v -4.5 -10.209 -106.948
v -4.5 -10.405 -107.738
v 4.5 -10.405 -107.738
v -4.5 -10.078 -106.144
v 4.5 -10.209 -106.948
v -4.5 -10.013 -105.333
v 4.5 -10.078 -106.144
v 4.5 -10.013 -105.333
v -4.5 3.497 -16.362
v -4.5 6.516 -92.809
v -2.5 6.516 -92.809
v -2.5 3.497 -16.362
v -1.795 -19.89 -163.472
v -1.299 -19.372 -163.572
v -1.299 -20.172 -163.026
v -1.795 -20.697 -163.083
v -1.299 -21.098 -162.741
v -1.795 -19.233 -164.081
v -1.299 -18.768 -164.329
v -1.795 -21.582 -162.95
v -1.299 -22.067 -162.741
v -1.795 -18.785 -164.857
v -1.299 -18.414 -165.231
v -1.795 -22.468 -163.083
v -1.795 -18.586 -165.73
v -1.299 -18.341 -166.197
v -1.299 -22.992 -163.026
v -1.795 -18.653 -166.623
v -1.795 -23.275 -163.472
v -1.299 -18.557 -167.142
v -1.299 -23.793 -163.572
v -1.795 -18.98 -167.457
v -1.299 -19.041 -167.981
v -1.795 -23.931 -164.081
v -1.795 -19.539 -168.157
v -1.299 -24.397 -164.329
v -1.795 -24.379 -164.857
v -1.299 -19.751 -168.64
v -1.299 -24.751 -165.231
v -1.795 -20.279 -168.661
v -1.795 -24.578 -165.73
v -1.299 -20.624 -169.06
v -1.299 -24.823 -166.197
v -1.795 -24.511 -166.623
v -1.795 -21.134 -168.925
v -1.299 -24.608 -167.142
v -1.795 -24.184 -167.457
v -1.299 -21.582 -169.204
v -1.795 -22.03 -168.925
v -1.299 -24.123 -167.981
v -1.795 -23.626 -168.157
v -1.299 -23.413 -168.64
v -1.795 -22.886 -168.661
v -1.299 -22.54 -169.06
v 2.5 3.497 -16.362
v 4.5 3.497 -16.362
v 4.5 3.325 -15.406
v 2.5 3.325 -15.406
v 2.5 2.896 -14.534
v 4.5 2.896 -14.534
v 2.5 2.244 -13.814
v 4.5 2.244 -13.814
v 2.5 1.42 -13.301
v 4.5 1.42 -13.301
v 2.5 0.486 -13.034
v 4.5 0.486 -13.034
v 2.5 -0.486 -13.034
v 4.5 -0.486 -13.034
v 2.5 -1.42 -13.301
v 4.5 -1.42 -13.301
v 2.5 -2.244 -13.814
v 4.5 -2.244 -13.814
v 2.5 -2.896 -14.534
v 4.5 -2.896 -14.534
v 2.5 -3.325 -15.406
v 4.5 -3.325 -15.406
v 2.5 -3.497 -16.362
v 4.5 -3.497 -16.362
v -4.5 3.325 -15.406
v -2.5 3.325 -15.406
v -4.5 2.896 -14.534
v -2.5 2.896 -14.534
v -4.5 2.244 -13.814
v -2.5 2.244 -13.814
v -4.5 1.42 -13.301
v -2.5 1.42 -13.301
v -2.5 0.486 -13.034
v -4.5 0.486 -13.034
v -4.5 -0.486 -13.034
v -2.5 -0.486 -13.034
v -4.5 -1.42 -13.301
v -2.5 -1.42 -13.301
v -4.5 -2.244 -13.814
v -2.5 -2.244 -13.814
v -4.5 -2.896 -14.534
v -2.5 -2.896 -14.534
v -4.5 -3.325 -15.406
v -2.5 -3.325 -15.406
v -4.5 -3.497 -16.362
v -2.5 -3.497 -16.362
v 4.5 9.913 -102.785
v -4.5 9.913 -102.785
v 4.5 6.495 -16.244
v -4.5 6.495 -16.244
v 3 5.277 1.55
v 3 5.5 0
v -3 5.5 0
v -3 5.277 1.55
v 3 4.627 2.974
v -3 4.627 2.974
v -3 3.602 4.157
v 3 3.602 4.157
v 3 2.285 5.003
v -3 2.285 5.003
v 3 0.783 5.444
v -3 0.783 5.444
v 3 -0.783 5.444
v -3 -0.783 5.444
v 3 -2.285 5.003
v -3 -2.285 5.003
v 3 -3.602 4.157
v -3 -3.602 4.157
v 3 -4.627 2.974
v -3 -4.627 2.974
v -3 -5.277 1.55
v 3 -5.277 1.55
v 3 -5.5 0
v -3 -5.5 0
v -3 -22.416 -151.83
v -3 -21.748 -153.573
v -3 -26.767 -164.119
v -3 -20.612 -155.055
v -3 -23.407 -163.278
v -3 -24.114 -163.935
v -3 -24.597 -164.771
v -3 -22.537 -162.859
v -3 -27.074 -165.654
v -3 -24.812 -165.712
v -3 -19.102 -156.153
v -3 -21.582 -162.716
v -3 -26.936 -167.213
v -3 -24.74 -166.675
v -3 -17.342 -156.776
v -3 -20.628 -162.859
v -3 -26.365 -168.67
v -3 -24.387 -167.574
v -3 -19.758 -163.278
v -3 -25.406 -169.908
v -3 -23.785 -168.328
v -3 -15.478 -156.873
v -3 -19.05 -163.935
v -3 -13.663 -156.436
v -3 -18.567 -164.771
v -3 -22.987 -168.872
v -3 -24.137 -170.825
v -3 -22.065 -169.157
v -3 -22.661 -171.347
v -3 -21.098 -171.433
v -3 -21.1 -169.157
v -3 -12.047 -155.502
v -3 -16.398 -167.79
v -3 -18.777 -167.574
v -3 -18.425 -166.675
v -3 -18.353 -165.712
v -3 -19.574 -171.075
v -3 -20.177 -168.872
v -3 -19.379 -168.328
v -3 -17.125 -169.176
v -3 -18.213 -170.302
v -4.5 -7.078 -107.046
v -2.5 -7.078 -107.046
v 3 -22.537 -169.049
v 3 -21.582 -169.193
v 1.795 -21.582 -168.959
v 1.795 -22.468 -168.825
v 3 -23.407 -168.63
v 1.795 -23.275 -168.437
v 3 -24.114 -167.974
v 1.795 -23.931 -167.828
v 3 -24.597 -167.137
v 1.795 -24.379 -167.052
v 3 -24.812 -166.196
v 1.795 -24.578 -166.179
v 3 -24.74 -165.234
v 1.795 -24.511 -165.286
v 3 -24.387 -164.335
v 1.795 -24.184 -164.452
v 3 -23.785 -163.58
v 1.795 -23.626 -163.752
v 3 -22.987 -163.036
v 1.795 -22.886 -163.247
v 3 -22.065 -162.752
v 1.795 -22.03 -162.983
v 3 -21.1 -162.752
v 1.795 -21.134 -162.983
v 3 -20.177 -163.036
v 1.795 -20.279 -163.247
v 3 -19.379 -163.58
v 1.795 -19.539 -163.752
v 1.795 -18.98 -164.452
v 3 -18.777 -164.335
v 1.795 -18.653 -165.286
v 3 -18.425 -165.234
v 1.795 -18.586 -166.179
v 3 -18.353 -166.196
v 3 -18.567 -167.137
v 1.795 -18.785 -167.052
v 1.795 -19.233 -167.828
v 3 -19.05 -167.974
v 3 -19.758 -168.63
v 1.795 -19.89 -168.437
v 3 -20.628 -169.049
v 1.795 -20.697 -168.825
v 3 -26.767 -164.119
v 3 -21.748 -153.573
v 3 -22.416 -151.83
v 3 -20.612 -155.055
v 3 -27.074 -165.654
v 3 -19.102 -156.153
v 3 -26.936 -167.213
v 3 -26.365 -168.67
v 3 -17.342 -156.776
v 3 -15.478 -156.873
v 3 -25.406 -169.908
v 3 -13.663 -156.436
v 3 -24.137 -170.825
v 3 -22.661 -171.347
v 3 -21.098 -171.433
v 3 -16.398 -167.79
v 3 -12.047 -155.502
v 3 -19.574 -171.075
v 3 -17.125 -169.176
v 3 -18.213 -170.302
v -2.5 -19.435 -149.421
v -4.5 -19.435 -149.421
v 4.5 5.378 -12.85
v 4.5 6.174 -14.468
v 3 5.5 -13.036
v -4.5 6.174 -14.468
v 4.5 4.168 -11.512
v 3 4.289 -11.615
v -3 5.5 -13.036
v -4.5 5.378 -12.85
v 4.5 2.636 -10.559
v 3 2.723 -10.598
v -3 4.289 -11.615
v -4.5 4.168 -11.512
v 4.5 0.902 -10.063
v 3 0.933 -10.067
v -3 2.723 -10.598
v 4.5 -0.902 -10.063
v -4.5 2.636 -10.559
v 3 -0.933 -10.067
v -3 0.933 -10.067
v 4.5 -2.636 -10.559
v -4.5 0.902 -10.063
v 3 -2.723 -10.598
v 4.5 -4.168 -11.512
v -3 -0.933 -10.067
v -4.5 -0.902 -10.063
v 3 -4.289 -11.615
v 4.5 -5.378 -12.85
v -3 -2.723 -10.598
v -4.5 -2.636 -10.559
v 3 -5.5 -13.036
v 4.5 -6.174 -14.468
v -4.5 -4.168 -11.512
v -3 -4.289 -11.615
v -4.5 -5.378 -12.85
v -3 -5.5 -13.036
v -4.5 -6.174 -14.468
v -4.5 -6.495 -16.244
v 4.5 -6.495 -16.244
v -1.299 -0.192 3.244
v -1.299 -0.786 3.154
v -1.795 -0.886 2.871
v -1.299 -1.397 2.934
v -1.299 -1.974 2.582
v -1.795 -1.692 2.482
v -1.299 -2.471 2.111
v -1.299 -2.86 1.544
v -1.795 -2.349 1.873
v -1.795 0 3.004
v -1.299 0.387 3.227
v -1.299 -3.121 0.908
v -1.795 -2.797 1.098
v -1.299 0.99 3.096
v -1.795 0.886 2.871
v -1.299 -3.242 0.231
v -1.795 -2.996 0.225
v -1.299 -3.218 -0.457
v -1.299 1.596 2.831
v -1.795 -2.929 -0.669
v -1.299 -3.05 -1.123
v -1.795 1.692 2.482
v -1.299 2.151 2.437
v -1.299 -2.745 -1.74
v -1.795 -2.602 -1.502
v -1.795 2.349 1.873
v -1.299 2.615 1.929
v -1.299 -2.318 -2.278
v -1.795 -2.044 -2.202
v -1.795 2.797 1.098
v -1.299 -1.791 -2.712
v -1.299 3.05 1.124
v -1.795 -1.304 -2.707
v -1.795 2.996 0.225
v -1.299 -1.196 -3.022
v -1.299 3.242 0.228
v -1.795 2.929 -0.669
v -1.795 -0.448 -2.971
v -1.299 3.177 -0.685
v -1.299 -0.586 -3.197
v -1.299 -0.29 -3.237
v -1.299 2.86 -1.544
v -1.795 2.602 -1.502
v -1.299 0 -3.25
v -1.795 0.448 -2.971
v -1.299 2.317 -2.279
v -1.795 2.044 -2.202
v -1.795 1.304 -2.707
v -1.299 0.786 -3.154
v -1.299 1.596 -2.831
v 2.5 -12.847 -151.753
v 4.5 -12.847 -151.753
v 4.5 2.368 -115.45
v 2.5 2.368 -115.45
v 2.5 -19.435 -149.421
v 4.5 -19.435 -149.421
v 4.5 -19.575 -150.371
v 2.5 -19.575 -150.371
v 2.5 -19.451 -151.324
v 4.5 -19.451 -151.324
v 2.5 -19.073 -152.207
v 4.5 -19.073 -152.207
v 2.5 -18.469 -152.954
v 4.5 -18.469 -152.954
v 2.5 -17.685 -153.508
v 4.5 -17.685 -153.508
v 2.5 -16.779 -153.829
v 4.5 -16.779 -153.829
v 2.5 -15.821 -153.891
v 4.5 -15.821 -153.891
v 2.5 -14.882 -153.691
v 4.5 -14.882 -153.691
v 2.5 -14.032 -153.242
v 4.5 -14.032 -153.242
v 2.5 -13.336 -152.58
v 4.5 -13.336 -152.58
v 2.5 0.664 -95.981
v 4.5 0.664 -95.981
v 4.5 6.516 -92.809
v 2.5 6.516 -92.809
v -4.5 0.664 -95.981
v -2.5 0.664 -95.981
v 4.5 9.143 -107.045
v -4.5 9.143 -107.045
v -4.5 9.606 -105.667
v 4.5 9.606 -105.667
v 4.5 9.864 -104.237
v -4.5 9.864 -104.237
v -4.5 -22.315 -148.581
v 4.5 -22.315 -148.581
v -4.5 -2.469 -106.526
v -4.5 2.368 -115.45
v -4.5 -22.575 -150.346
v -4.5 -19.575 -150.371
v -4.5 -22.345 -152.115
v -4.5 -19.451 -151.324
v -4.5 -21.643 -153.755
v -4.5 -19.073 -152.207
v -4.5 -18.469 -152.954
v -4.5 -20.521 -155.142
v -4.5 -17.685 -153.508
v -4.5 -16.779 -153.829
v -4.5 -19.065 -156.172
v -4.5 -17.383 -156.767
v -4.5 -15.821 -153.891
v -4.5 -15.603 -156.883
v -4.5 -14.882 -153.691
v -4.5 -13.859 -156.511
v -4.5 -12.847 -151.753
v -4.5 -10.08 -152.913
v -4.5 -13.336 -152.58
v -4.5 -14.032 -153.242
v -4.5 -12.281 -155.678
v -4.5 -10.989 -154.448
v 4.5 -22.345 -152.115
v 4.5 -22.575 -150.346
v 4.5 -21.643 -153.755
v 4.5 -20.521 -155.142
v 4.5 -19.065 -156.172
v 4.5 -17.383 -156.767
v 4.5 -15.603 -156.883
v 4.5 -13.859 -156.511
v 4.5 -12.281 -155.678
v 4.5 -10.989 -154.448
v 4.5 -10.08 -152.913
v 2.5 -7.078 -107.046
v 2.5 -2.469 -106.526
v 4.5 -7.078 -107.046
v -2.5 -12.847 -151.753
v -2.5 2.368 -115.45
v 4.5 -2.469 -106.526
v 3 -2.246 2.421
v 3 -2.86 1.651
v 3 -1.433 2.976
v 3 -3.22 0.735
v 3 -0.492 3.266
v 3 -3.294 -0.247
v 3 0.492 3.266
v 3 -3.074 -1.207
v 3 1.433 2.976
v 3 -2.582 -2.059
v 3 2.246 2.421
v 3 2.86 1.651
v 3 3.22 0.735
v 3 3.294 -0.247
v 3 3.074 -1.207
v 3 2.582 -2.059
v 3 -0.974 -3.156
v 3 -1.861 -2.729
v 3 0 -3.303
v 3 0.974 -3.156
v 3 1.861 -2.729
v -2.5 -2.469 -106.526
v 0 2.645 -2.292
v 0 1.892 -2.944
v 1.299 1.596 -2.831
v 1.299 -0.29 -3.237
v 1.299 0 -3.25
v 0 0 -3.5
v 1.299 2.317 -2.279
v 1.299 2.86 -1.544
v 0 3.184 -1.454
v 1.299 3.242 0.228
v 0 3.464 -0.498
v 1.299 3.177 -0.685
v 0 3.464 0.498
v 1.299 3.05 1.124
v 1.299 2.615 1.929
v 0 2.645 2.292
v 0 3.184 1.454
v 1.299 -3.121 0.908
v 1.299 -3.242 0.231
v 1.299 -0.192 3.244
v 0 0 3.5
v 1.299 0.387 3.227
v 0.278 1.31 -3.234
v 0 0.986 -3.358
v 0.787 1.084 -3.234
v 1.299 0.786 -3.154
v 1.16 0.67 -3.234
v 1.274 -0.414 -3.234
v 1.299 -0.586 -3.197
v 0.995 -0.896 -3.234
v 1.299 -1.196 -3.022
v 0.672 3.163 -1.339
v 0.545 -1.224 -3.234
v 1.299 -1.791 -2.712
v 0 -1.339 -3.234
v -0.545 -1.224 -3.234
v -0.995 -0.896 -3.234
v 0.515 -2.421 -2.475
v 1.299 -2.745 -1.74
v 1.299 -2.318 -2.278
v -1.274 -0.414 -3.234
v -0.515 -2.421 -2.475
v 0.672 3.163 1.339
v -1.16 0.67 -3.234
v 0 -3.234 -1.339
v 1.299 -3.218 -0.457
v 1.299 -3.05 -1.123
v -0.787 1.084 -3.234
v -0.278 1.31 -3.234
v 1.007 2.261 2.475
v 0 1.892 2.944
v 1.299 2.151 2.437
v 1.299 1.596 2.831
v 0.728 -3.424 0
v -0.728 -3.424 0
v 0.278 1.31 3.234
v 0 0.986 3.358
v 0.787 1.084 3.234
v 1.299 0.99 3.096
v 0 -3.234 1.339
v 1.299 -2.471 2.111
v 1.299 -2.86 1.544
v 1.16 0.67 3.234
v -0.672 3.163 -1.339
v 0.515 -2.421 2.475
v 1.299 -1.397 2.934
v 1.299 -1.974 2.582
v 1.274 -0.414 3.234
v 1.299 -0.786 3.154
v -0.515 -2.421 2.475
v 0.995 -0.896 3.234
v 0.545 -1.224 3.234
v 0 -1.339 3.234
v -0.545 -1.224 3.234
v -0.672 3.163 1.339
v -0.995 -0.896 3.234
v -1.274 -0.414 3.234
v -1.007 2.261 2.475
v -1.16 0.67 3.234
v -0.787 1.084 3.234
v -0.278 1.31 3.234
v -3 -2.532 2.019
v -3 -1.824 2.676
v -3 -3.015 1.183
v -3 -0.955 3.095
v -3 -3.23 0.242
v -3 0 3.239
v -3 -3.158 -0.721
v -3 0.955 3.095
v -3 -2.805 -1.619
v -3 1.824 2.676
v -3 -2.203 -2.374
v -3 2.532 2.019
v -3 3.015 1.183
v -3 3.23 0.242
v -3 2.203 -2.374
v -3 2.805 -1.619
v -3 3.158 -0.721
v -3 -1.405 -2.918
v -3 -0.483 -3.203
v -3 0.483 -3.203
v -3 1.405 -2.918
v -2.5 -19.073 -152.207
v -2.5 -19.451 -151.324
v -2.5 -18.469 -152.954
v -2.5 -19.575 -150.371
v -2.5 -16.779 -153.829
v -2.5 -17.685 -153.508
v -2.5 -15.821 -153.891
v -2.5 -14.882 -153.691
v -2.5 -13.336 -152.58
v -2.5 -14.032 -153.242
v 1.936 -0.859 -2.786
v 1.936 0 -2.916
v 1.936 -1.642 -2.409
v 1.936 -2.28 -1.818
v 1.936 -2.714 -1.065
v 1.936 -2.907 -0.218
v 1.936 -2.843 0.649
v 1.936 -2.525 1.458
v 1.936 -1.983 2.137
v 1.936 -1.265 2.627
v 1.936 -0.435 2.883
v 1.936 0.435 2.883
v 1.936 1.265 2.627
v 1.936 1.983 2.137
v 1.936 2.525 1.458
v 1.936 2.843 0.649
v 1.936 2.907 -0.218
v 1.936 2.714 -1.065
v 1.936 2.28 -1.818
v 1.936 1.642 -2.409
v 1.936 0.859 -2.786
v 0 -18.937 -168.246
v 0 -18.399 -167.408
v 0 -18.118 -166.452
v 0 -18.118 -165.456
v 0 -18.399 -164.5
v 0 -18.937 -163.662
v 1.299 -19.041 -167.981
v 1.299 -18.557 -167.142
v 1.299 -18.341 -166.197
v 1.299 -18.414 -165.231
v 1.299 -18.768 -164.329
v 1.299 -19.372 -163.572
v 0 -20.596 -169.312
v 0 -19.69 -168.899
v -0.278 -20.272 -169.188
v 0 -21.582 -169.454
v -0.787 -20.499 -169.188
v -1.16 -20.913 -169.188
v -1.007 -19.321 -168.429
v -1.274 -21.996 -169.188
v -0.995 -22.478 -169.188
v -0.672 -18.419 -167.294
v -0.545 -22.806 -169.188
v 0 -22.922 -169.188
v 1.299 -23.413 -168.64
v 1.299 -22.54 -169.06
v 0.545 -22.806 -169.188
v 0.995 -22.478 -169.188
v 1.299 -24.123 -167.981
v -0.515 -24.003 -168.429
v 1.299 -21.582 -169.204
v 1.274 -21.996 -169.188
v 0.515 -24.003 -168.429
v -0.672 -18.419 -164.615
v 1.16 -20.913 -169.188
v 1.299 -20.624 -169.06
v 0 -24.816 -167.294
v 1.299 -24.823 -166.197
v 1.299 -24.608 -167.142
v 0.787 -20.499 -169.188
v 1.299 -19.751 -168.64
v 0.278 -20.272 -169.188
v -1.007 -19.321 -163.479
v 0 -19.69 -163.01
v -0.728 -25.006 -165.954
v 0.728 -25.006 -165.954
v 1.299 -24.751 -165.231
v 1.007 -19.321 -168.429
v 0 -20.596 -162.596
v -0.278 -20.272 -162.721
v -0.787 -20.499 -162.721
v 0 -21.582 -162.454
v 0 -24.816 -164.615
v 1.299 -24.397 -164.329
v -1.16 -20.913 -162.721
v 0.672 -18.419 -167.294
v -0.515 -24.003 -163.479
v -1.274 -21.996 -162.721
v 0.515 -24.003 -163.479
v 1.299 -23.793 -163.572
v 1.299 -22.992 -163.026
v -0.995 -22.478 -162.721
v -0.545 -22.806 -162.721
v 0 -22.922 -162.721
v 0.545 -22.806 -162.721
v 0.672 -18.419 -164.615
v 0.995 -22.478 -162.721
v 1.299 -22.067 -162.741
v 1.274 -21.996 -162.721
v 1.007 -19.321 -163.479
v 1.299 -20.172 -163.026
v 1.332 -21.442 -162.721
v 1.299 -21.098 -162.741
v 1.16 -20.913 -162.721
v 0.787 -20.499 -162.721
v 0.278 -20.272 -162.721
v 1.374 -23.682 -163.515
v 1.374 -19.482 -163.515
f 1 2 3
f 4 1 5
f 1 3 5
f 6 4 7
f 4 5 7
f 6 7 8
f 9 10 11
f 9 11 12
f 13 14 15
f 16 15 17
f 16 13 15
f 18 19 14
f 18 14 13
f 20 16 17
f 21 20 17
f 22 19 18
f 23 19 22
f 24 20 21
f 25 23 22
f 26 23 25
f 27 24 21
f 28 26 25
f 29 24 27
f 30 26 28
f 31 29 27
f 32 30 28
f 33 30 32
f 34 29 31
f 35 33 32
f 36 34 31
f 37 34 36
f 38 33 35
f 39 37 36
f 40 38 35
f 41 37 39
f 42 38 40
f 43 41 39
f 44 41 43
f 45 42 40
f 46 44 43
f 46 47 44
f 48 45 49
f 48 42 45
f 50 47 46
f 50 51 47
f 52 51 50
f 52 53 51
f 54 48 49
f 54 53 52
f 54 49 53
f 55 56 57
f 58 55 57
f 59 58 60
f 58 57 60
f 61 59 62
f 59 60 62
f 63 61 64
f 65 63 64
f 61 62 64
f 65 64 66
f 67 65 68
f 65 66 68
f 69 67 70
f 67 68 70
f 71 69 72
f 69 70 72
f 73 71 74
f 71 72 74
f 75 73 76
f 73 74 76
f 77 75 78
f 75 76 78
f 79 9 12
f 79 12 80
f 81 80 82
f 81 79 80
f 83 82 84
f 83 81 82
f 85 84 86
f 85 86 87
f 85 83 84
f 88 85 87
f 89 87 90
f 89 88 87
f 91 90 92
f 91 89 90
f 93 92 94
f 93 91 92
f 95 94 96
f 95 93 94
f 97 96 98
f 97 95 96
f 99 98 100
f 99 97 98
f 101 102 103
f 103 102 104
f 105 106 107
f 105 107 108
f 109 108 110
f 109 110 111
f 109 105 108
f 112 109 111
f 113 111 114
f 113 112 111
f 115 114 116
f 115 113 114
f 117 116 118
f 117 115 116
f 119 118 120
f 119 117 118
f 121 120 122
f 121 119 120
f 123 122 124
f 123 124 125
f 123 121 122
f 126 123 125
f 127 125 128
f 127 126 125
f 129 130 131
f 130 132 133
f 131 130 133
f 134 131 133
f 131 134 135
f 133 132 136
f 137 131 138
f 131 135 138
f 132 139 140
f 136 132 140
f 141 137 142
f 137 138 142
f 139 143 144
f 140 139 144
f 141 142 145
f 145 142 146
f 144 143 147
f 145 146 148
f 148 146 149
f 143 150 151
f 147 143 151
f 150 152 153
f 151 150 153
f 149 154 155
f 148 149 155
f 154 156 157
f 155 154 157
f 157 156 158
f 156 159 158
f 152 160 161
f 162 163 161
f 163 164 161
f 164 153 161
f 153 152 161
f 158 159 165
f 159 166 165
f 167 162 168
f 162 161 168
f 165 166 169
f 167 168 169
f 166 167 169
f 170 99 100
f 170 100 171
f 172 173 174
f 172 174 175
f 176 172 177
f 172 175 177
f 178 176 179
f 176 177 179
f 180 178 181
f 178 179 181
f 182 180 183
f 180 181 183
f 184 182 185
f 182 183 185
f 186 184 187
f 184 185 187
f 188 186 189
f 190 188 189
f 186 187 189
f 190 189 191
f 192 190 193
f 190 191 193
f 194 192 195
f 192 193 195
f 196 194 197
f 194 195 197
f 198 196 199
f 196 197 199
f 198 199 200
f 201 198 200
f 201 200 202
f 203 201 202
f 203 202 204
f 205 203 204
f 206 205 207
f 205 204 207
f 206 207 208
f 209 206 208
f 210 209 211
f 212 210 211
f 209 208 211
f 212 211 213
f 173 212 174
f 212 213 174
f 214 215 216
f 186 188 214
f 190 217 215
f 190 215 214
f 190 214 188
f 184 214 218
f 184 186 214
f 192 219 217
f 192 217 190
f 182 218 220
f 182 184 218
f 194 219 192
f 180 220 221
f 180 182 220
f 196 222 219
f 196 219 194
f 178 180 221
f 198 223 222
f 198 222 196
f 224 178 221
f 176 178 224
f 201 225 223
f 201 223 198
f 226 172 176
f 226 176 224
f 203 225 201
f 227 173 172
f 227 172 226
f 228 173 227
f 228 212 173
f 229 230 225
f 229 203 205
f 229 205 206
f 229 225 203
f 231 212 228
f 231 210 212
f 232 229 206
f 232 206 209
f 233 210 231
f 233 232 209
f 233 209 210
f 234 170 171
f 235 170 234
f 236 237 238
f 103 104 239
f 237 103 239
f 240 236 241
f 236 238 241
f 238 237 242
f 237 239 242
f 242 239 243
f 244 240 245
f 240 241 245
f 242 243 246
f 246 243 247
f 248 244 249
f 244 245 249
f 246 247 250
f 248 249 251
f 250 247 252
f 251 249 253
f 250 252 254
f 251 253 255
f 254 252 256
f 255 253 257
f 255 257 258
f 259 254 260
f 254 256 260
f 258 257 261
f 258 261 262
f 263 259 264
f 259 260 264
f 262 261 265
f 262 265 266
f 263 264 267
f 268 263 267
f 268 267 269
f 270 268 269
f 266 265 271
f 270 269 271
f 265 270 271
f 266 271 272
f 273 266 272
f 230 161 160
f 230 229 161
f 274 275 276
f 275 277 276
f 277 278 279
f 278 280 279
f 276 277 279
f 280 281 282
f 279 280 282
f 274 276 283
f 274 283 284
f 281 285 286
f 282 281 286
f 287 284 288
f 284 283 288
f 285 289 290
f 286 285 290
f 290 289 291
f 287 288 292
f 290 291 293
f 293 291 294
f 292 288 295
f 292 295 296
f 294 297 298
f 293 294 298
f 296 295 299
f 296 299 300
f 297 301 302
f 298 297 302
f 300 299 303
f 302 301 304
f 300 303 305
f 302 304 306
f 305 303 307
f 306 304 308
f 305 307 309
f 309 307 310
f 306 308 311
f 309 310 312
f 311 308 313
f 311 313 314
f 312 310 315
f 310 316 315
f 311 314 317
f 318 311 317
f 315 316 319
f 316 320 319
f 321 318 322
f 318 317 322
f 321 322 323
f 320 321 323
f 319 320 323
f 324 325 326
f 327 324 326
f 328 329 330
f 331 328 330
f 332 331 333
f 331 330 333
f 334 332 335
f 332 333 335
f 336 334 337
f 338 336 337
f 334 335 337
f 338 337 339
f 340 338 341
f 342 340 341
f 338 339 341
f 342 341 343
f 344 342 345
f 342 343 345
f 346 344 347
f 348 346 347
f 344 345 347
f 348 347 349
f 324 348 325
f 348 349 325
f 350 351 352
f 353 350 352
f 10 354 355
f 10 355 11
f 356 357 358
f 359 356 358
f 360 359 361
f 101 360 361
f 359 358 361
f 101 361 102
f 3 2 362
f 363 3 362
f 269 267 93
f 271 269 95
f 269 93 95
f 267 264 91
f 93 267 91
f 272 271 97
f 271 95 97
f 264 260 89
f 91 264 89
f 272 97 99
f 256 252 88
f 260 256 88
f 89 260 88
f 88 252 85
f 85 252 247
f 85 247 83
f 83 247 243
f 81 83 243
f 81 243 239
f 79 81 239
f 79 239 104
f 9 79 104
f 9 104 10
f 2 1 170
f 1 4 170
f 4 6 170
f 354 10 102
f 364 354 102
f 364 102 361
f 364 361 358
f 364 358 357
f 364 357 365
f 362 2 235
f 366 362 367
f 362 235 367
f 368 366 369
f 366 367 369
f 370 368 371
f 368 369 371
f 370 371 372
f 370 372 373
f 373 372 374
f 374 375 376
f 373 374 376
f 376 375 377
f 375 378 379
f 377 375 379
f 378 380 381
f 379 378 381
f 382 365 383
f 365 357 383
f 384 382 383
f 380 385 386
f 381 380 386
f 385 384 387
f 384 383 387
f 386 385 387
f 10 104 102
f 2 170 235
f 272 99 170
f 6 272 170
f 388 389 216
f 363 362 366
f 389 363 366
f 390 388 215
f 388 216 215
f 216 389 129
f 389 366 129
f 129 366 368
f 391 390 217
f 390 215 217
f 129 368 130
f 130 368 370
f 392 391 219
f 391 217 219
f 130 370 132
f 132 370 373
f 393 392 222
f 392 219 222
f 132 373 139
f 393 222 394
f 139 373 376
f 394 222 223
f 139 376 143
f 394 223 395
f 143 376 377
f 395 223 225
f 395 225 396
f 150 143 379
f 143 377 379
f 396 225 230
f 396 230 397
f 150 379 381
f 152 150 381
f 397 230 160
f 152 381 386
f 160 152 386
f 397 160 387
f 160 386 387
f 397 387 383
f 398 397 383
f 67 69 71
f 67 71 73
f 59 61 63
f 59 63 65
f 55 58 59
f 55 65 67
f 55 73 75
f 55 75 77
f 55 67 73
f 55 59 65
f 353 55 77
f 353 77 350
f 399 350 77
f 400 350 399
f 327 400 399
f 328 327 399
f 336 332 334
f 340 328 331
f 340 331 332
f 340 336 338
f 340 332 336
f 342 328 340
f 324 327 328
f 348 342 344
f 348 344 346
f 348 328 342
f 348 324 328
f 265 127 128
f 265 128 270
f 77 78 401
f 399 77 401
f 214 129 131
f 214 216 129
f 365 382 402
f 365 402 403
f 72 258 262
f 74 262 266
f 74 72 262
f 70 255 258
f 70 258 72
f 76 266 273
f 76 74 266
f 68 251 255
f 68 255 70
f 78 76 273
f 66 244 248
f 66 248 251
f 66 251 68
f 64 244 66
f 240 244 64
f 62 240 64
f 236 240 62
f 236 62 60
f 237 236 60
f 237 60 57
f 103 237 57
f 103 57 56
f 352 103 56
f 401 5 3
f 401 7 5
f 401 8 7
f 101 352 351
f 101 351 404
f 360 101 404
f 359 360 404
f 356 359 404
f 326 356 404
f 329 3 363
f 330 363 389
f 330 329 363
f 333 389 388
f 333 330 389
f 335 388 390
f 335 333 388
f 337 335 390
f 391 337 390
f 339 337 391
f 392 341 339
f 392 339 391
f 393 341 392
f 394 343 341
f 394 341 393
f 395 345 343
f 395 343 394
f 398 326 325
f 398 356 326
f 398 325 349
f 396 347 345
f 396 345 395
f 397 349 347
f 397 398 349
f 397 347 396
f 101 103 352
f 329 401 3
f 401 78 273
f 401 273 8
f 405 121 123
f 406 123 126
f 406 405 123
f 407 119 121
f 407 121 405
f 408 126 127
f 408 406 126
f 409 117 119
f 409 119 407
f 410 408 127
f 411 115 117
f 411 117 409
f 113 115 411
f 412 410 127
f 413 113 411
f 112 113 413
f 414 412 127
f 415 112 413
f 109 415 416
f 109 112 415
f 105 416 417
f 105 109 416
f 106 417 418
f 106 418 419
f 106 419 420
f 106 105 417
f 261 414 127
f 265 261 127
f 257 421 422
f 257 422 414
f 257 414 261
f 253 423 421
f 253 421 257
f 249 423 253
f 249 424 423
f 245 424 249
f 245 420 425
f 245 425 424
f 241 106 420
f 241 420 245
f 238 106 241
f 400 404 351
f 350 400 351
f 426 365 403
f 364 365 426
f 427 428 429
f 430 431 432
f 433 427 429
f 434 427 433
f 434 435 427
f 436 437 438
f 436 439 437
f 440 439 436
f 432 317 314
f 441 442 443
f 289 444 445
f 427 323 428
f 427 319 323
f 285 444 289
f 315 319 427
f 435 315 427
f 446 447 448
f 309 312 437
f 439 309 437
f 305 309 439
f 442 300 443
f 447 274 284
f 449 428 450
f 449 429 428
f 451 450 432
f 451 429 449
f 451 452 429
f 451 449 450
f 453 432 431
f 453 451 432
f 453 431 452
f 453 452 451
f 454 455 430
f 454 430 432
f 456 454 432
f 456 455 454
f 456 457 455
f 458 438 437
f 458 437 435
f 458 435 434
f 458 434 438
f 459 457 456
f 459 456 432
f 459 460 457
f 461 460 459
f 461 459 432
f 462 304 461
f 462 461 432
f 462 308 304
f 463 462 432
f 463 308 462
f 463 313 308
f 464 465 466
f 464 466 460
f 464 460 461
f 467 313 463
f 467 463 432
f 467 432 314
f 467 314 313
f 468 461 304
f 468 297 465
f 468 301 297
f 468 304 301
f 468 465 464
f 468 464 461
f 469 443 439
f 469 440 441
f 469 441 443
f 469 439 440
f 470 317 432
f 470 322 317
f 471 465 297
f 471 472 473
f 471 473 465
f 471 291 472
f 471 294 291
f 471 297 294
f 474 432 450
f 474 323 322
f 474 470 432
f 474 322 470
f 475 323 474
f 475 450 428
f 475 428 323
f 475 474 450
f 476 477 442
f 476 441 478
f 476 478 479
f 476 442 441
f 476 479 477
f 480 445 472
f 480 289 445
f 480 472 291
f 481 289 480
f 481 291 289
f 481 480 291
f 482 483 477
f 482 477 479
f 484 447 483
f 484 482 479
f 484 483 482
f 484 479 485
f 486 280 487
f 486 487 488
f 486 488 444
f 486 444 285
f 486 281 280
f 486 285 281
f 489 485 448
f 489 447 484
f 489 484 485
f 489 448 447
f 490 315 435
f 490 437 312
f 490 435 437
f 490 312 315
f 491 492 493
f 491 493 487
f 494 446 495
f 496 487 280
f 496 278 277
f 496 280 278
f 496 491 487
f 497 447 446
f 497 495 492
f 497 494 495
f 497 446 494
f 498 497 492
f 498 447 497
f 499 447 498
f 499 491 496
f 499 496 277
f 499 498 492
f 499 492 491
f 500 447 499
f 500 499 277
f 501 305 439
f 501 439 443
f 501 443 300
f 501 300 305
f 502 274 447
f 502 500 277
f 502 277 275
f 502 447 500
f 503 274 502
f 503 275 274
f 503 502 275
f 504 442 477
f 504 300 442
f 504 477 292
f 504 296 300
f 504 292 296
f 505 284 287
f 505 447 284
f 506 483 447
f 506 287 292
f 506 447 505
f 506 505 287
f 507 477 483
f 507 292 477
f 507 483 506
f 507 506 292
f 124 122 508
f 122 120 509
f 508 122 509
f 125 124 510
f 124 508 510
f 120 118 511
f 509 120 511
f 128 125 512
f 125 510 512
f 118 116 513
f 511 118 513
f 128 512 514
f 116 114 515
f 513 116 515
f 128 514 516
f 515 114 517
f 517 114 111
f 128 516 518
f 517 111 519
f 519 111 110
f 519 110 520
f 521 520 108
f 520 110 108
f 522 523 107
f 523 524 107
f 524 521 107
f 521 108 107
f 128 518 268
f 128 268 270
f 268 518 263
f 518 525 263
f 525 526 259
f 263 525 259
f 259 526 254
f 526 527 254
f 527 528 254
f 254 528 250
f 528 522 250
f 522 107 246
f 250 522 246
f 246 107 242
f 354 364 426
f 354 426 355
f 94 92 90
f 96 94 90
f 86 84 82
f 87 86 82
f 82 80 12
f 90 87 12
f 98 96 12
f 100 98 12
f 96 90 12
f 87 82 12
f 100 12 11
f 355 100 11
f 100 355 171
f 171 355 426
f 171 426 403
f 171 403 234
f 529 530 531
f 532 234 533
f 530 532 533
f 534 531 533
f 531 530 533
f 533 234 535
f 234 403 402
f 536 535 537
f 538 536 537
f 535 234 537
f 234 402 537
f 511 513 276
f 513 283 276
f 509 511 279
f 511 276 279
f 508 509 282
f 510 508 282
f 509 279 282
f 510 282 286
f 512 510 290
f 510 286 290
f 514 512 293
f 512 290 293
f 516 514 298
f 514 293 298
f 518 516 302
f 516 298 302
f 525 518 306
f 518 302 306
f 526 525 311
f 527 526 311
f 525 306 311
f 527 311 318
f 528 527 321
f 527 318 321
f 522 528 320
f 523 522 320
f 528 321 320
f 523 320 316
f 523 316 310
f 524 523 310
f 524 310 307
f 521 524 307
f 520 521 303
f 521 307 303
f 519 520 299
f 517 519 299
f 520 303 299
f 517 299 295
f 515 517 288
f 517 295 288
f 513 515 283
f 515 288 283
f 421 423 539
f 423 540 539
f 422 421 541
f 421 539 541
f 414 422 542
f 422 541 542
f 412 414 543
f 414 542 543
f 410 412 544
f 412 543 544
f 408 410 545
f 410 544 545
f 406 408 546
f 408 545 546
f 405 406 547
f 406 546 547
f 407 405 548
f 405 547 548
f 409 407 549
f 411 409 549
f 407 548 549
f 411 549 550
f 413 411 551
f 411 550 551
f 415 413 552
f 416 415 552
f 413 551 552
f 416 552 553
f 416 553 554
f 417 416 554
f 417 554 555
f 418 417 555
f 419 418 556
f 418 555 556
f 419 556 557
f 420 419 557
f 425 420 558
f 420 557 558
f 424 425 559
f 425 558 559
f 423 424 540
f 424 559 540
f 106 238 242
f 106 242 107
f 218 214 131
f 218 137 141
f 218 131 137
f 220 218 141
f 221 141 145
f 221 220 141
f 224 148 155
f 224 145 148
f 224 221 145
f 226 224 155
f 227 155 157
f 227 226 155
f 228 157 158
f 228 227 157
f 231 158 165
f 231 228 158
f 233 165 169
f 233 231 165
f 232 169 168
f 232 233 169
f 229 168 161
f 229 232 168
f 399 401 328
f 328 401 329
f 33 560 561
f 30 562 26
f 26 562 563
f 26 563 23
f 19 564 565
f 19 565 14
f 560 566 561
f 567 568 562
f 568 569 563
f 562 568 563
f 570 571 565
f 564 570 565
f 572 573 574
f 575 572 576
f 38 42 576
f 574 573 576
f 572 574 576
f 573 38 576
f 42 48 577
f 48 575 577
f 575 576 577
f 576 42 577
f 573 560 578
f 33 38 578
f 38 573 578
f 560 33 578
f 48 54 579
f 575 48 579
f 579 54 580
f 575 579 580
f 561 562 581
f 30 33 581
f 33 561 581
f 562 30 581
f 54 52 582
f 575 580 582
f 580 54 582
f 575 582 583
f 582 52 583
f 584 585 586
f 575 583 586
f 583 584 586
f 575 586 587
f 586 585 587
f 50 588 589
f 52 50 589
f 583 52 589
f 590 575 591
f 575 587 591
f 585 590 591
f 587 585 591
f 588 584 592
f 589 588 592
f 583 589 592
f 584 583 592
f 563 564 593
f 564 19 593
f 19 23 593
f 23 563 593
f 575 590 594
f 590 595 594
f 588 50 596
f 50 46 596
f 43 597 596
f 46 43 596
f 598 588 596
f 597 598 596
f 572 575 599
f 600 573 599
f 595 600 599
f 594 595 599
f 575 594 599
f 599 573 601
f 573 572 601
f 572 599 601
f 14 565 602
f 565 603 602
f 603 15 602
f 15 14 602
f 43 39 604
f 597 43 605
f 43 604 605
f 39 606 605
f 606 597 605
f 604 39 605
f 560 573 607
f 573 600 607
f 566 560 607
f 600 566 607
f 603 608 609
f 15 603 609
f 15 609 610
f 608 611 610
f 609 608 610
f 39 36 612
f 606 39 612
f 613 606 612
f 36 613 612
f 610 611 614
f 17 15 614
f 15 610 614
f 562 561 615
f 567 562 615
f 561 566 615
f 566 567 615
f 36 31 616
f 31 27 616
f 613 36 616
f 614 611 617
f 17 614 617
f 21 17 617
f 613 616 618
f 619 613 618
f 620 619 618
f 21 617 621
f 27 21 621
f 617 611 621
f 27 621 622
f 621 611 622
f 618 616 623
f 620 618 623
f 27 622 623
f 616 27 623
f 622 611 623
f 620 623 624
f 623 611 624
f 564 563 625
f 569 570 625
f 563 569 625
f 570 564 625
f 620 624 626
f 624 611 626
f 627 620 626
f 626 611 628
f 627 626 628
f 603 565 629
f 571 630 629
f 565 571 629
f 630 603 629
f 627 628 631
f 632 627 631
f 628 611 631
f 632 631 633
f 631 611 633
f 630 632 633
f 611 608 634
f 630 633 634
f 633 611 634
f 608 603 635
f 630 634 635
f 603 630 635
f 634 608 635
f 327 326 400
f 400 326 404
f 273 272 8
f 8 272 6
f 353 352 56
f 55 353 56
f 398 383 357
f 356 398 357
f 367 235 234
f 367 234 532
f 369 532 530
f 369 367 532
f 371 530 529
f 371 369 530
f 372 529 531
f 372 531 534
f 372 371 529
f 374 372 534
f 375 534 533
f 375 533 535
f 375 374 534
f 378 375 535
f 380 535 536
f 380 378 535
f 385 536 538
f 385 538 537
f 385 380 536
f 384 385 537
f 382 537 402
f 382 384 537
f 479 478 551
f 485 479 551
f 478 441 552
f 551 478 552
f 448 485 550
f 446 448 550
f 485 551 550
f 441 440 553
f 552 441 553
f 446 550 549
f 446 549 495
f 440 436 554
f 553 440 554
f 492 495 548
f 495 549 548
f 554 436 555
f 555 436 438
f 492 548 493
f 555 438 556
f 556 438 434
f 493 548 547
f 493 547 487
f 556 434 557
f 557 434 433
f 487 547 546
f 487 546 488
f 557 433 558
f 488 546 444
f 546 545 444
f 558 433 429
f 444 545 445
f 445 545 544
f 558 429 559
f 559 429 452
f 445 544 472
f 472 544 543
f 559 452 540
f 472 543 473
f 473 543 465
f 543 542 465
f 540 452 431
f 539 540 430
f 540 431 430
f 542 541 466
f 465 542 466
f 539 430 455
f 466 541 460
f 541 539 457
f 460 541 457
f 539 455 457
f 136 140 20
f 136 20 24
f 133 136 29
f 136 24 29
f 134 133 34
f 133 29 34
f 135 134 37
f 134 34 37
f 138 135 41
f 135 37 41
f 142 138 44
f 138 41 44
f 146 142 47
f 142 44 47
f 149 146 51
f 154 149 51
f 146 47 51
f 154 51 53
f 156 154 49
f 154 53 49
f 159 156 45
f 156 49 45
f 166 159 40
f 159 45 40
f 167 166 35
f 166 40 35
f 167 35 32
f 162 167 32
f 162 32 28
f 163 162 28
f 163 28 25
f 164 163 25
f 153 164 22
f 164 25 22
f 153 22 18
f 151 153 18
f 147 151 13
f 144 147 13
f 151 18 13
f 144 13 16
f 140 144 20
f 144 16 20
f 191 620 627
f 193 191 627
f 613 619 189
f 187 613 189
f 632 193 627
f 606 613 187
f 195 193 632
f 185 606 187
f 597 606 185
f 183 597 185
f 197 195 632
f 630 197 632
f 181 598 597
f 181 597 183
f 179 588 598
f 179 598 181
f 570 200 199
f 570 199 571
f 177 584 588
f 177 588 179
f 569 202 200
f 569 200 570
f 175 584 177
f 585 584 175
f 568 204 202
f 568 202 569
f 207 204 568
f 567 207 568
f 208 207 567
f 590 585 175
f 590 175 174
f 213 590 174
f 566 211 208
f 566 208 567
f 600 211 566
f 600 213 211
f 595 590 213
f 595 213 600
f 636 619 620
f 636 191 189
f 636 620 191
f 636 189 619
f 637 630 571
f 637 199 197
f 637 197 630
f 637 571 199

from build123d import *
from build123d.topology import SkipClean

# Parameters (mm, degrees)
SKETCH1_R           = 3.25
BOSS_EXTRUDE1_DEPTH = 3
BOSS_EXTRUDE2_START = -4.5
BOSS_EXTRUDE2_DEPTH = 9
CUT_EXTRUDE1_DEPTH  = 2
FILLET1_R           = 10
CUT_EXTRUDE2_DEPTH  = 17
CHAMFER1_SIZE       = 1.5
CHAMFER1_SIZE_2     = 1.435934089
CUT_EXTRUDE3_DEPTH  = 17
CHAMFER2_SIZE       = 1.435934089


with BuildPart() as part:
    # Sketch1 → Boss-Extrude1 (new, symmetric)
    with BuildSketch(Plane(origin=(0, 0, 0), x_dir=(0, 0, -1), z_dir=(1, 0, 0))):
        with BuildLine():
            Line((105, 10), (16.24350989, 6.494937476))
            ThreePointArc((16.24350989, 6.494937476), (14.574337558, 6.208206195), (13.035898385, 5.5))
            Line((13.035898385, 5.5), (0, 5.5))
            ThreePointArc((0, 5.5), (-5.5, 0), (0, -5.5))
            Line((0, -5.5), (13.035898385, -5.5))
            ThreePointArc((13.035898385, -5.5), (14.574337558, -6.208206195), (16.24350989, -6.494937476))
            Line((16.24350989, -6.494937476), (106.559228351, -10.061575135))
            Line((106.559228351, -10.061575135), (148.580824133, -22.31516659))
            ThreePointArc((148.580824133, -22.31516659), (150.199105044, -22.57193923), (151.830180598, -22.41586927))
            Line((151.830180598, -22.41586927), (164.118536879, -26.766840037))
            ThreePointArc((164.118536879, -26.766840037), (171.138866131, -23.417963033), (167.789989128, -16.397633781))
            Line((167.789989128, -16.397633781), (155.501632847, -12.046663013))
            ThreePointArc((155.501632847, -12.046663013), (154.332173391, -10.899000225), (152.912873821, -10.08024872))
            Line((152.912873821, -10.08024872), (105, 10))
        make_face()
        Circle(SKETCH1_R, mode=Mode.SUBTRACT)
        with Locations((165.954263003, -21.582236909)):
            Circle(SKETCH1_R, mode=Mode.SUBTRACT)
    extrude(amount=BOSS_EXTRUDE1_DEPTH, both=True)

    # Boss-Extrude2: read off the stored shape, not the designer's step
    # Boss-Extrude2 outline → Boss-Extrude2 (add)
    with SkipClean():  # the faces are left unmerged after this step: merging them gives an invalid solid
        with BuildSketch(Plane(origin=(0, 0, 0), x_dir=(0, 0, -1), z_dir=(1, 0, 0)).offset(BOSS_EXTRUDE2_START)):
            with BuildLine():
                ThreePointArc((148.580824133, -22.31516659), (156.527711861, -18.244553046), (152.912873821, -10.08024872))
                Line((152.912873821, -10.08024872), (105, 10))
                Line((105, 10), (16.24350989, 6.494937476))
                ThreePointArc((16.24350989, 6.494937476), (10, 0), (16.24350989, -6.494937476))
                Line((16.24350989, -6.494937476), (106.559228351, -10.061575135))
                Line((106.559228351, -10.061575135), (148.580824133, -22.31516659))
            make_face()
        extrude(amount=BOSS_EXTRUDE2_DEPTH)

    # Sketch2 → Cut-Extrude1 (cut)
    with SkipClean():  # the faces are left unmerged after this step: merging them gives an invalid solid
        with BuildSketch(Plane(origin=(4.5, 0, 0), x_dir=(0, 0, -1), z_dir=(1, 0, 0))):
            with BuildLine():
                Line((95.980965998, 0.663794286), (92.809228462, 6.516238621))
                Line((92.809228462, 6.516238621), (16.361889941, 3.497274026))
                ThreePointArc((16.361889941, 3.497274026), (13, 0), (16.361889941, -3.497274026))
                Line((16.361889941, -3.497274026), (107.045551003, -7.078442023))
                Line((107.045551003, -7.078442023), (149.420653126, -19.435116719))
                ThreePointArc((149.420653126, -19.435116719), (153.699746519, -17.243247888), (151.753295266, -12.847084019))
                Line((151.753295266, -12.847084019), (115.449531272, 2.367795664))
                Line((115.449531272, 2.367795664), (106.52555447, -2.46856169))
                Line((106.52555447, -2.46856169), (95.980965998, 0.663794286))
            make_face()
        cut_extrude1 = extrude(amount=-CUT_EXTRUDE1_DEPTH, mode=Mode.SUBTRACT)

    # Mirror1: Cut-Extrude1 across plane
    with SkipClean():  # the faces are left unmerged after this step: merging them gives an invalid solid
        add(cut_extrude1.mirror(Plane(origin=(0, 0, 0), x_dir=(0, 0, 1), z_dir=(1, 0, 0))), mode=Mode.SUBTRACT)

    # Fillet1
    fillet1_edges = [part.edges().sort_by_distance(p)[0] for p in [
        (0, -10.061575135, -106.559228351),
        (0, 10, -105),
    ]]
    fillet(fillet1_edges, radius=FILLET1_R)

    # Sketch3 → Revolve1 (revolve)
    with SkipClean():  # the faces are left unmerged after this step: merging them gives an invalid solid
        with BuildSketch(Plane(origin=(0, 0, 0), x_dir=(0, 0, -1), z_dir=(1, 0, 0))):
            with BuildLine():
                ThreePointArc((4.5, 0), (0, 4.5), (-4.5, 0))
                Line((-4.5, 0), (-3.5, 0))
                ThreePointArc((-3.5, 0), (0, 3.5), (3.5, 0))
                Line((3.5, 0), (4.5, 0))
            make_face()
        revolve(axis=Axis((0, 0, 4.5), (0, 0, -1)))

    # Sketch4 → Cut-Extrude2 (cut)
    with SkipClean():  # the faces are left unmerged after this step: merging them gives an invalid solid
        with BuildSketch(Plane(origin=(0, 5.5, 0), x_dir=(1, 0, 0), z_dir=(0, 1, 0))):
            Polygon((3, 0), (3, -6.291238928), (6.747077204, -6.291238928), (6.747077204, 6.985365783), (3, 6.985365783), align=None)
            Polygon((-5.881309599, 6.985365783), (-5.881309599, -6.291238928), (-3, -6.291238928), (-3, 0), (-3, 6.985365783), align=None)
        extrude(amount=-CUT_EXTRUDE2_DEPTH, mode=Mode.SUBTRACT)

    # Chamfer1
    # the kernel refuses this chamfer: 1.5, 1.435934089 mm, written as the material it takes off along each edge
    with BuildSketch(Plane(origin=(3, 0, 0), x_dir=(0, 0, -1), z_dir=(0, 1, 0))) as chamfer1_piece_1:
        with BuildLine():
            Line((1.802775638 + CHAMFER1_SIZE, 0), (2.915614393, 1.063716779))
            ThreePointArc((2.915614393, 1.063716779), (2.427398497, 0.478544758), (1.802775638, 0))
            Line((1.802775638, 0), (1.802775638 + CHAMFER1_SIZE, 0))
        make_face()
    revolve(axis=Axis((3, 0, 0), (-1, 0, 0)), mode=Mode.SUBTRACT)
    with BuildSketch(Plane(origin=(-3, 0, 0), x_dir=(0, 0, 1), z_dir=(0, 1, 0))) as chamfer1_piece_2:
        with BuildLine():
            Line((1.802775638 + CHAMFER1_SIZE_2, 0), (3.00448024, 1.204701004))
            ThreePointArc((3.00448024, 1.204701004), (2.490248254, 0.540596895), (1.802775638, 0))
            Line((1.802775638, 0), (1.802775638 + CHAMFER1_SIZE_2, 0))
        make_face()
    revolve(axis=Axis((-3, 0, 0), (1, 0, 0)), mode=Mode.SUBTRACT)

    # Sketch5 → Revolve2 (revolve)
    with SkipClean():  # the faces are left unmerged after this step: merging them gives an invalid solid
        with BuildSketch(Plane(origin=(0, 0, 0), x_dir=(0, 0, -1), z_dir=(1, 0, 0))):
            with BuildLine():
                Line((169.454263003, -21.582236909), (170.454263003, -21.582236909))
                ThreePointArc((170.454263003, -21.582236909), (165.954263003, -17.082236909), (161.454263003, -21.582236909))
                Line((161.454263003, -21.582236909), (162.454263003, -21.582236909))
                ThreePointArc((162.454263003, -21.582236909), (165.954263003, -18.082236909), (169.454263003, -21.582236909))
            make_face()
        revolve(axis=Axis((0, -21.582236909, -170.454263003), (0, 0, 1)))

    # Sketch6 → Cut-Extrude3 (cut)
    with SkipClean():  # the faces are left unmerged after this step: merging them gives an invalid solid
        with BuildSketch(Plane(origin=(0, 38.220593136, -13.532866369), x_dir=(1, 0, 0), z_dir=(0, 0.9426551142039149, -0.33376838625790206))):
            Polygon((-6.767171252, 154.311979975), (-3, 154.311979975), (-3, 163.641103129), (-3, 169.141103129), (3, 169.141103129), (3, 154.311979975), (6.783794008, 154.311979975), (6.783794008, 170.859793321), (-6.767171252, 170.859793321), align=None)
        extrude(amount=-CUT_EXTRUDE3_DEPTH, mode=Mode.SUBTRACT)

    # Chamfer2
    # the kernel refuses this chamfer: 1.5, 1.435934089 mm, written as the material it takes off along each edge
    with BuildSketch(Plane(origin=(3, -21.582236909, -165.954263003), x_dir=(0, 0, -1), z_dir=(0, 1, 0))) as chamfer2_piece_1:
        with BuildLine():
            Line((1.802775638 + CHAMFER2_SIZE, 0), (3.00448024, 1.204701004))
            ThreePointArc((3.00448024, 1.204701004), (2.490248254, 0.540596895), (1.802775638, 0))
            Line((1.802775638, 0), (1.802775638 + CHAMFER2_SIZE, 0))
        make_face()
    revolve(axis=Axis((3, -21.582236909, -165.954263003), (-1, 0, 0)), mode=Mode.SUBTRACT)
    with BuildSketch(Plane(origin=(-3, -21.582236909, -165.954263003), x_dir=(0, 0, 1), z_dir=(0, 1, 0))) as chamfer2_piece_2:
        with BuildLine():
            Line((1.802775638 + CHAMFER2_SIZE, 0), (3.00448024, 1.204701004))
            ThreePointArc((3.00448024, 1.204701004), (2.490248254, 0.540596895), (1.802775638, 0))
            Line((1.802775638, 0), (1.802775638 + CHAMFER2_SIZE, 0))
        make_face()
    revolve(axis=Axis((-3, -21.582236909, -165.954263003), (1, 0, 0)), mode=Mode.SUBTRACT)

    # Sketch5<6> → Cut-Revolve1 (revolve, cut)
    with SkipClean():  # the faces are left unmerged after this step: merging them gives an invalid solid
        with BuildSketch(Plane(origin=(0, 0, 0), x_dir=(0, 0, -1), z_dir=(1, 0, 0))):
            with BuildLine():
                Line((162.454263003, -21.582236909), (169.454263003, -21.582236909))
                ThreePointArc((169.454263003, -21.582236909), (165.954263003, -18.082236909), (162.454263003, -21.582236909))
            make_face()
        revolve(axis=Axis((0, -21.582236909, -170.454263003), (0, 0, 1)), mode=Mode.SUBTRACT)

    # Sketch3<6> → Cut-Revolve2 (revolve, cut)
    with SkipClean():  # the faces are left unmerged after this step: merging them gives an invalid solid
        with BuildSketch(Plane(origin=(0, 0, 0), x_dir=(0, 0, -1), z_dir=(1, 0, 0))):
            with BuildLine():
                ThreePointArc((3.5, 0), (0, 3.5), (-3.5, 0))
                Line((-3.5, 0), (3.5, 0))
            make_face()
        revolve(axis=Axis((0, 0, 4.5), (0, 0, -1)), mode=Mode.SUBTRACT)


solid = part.part
